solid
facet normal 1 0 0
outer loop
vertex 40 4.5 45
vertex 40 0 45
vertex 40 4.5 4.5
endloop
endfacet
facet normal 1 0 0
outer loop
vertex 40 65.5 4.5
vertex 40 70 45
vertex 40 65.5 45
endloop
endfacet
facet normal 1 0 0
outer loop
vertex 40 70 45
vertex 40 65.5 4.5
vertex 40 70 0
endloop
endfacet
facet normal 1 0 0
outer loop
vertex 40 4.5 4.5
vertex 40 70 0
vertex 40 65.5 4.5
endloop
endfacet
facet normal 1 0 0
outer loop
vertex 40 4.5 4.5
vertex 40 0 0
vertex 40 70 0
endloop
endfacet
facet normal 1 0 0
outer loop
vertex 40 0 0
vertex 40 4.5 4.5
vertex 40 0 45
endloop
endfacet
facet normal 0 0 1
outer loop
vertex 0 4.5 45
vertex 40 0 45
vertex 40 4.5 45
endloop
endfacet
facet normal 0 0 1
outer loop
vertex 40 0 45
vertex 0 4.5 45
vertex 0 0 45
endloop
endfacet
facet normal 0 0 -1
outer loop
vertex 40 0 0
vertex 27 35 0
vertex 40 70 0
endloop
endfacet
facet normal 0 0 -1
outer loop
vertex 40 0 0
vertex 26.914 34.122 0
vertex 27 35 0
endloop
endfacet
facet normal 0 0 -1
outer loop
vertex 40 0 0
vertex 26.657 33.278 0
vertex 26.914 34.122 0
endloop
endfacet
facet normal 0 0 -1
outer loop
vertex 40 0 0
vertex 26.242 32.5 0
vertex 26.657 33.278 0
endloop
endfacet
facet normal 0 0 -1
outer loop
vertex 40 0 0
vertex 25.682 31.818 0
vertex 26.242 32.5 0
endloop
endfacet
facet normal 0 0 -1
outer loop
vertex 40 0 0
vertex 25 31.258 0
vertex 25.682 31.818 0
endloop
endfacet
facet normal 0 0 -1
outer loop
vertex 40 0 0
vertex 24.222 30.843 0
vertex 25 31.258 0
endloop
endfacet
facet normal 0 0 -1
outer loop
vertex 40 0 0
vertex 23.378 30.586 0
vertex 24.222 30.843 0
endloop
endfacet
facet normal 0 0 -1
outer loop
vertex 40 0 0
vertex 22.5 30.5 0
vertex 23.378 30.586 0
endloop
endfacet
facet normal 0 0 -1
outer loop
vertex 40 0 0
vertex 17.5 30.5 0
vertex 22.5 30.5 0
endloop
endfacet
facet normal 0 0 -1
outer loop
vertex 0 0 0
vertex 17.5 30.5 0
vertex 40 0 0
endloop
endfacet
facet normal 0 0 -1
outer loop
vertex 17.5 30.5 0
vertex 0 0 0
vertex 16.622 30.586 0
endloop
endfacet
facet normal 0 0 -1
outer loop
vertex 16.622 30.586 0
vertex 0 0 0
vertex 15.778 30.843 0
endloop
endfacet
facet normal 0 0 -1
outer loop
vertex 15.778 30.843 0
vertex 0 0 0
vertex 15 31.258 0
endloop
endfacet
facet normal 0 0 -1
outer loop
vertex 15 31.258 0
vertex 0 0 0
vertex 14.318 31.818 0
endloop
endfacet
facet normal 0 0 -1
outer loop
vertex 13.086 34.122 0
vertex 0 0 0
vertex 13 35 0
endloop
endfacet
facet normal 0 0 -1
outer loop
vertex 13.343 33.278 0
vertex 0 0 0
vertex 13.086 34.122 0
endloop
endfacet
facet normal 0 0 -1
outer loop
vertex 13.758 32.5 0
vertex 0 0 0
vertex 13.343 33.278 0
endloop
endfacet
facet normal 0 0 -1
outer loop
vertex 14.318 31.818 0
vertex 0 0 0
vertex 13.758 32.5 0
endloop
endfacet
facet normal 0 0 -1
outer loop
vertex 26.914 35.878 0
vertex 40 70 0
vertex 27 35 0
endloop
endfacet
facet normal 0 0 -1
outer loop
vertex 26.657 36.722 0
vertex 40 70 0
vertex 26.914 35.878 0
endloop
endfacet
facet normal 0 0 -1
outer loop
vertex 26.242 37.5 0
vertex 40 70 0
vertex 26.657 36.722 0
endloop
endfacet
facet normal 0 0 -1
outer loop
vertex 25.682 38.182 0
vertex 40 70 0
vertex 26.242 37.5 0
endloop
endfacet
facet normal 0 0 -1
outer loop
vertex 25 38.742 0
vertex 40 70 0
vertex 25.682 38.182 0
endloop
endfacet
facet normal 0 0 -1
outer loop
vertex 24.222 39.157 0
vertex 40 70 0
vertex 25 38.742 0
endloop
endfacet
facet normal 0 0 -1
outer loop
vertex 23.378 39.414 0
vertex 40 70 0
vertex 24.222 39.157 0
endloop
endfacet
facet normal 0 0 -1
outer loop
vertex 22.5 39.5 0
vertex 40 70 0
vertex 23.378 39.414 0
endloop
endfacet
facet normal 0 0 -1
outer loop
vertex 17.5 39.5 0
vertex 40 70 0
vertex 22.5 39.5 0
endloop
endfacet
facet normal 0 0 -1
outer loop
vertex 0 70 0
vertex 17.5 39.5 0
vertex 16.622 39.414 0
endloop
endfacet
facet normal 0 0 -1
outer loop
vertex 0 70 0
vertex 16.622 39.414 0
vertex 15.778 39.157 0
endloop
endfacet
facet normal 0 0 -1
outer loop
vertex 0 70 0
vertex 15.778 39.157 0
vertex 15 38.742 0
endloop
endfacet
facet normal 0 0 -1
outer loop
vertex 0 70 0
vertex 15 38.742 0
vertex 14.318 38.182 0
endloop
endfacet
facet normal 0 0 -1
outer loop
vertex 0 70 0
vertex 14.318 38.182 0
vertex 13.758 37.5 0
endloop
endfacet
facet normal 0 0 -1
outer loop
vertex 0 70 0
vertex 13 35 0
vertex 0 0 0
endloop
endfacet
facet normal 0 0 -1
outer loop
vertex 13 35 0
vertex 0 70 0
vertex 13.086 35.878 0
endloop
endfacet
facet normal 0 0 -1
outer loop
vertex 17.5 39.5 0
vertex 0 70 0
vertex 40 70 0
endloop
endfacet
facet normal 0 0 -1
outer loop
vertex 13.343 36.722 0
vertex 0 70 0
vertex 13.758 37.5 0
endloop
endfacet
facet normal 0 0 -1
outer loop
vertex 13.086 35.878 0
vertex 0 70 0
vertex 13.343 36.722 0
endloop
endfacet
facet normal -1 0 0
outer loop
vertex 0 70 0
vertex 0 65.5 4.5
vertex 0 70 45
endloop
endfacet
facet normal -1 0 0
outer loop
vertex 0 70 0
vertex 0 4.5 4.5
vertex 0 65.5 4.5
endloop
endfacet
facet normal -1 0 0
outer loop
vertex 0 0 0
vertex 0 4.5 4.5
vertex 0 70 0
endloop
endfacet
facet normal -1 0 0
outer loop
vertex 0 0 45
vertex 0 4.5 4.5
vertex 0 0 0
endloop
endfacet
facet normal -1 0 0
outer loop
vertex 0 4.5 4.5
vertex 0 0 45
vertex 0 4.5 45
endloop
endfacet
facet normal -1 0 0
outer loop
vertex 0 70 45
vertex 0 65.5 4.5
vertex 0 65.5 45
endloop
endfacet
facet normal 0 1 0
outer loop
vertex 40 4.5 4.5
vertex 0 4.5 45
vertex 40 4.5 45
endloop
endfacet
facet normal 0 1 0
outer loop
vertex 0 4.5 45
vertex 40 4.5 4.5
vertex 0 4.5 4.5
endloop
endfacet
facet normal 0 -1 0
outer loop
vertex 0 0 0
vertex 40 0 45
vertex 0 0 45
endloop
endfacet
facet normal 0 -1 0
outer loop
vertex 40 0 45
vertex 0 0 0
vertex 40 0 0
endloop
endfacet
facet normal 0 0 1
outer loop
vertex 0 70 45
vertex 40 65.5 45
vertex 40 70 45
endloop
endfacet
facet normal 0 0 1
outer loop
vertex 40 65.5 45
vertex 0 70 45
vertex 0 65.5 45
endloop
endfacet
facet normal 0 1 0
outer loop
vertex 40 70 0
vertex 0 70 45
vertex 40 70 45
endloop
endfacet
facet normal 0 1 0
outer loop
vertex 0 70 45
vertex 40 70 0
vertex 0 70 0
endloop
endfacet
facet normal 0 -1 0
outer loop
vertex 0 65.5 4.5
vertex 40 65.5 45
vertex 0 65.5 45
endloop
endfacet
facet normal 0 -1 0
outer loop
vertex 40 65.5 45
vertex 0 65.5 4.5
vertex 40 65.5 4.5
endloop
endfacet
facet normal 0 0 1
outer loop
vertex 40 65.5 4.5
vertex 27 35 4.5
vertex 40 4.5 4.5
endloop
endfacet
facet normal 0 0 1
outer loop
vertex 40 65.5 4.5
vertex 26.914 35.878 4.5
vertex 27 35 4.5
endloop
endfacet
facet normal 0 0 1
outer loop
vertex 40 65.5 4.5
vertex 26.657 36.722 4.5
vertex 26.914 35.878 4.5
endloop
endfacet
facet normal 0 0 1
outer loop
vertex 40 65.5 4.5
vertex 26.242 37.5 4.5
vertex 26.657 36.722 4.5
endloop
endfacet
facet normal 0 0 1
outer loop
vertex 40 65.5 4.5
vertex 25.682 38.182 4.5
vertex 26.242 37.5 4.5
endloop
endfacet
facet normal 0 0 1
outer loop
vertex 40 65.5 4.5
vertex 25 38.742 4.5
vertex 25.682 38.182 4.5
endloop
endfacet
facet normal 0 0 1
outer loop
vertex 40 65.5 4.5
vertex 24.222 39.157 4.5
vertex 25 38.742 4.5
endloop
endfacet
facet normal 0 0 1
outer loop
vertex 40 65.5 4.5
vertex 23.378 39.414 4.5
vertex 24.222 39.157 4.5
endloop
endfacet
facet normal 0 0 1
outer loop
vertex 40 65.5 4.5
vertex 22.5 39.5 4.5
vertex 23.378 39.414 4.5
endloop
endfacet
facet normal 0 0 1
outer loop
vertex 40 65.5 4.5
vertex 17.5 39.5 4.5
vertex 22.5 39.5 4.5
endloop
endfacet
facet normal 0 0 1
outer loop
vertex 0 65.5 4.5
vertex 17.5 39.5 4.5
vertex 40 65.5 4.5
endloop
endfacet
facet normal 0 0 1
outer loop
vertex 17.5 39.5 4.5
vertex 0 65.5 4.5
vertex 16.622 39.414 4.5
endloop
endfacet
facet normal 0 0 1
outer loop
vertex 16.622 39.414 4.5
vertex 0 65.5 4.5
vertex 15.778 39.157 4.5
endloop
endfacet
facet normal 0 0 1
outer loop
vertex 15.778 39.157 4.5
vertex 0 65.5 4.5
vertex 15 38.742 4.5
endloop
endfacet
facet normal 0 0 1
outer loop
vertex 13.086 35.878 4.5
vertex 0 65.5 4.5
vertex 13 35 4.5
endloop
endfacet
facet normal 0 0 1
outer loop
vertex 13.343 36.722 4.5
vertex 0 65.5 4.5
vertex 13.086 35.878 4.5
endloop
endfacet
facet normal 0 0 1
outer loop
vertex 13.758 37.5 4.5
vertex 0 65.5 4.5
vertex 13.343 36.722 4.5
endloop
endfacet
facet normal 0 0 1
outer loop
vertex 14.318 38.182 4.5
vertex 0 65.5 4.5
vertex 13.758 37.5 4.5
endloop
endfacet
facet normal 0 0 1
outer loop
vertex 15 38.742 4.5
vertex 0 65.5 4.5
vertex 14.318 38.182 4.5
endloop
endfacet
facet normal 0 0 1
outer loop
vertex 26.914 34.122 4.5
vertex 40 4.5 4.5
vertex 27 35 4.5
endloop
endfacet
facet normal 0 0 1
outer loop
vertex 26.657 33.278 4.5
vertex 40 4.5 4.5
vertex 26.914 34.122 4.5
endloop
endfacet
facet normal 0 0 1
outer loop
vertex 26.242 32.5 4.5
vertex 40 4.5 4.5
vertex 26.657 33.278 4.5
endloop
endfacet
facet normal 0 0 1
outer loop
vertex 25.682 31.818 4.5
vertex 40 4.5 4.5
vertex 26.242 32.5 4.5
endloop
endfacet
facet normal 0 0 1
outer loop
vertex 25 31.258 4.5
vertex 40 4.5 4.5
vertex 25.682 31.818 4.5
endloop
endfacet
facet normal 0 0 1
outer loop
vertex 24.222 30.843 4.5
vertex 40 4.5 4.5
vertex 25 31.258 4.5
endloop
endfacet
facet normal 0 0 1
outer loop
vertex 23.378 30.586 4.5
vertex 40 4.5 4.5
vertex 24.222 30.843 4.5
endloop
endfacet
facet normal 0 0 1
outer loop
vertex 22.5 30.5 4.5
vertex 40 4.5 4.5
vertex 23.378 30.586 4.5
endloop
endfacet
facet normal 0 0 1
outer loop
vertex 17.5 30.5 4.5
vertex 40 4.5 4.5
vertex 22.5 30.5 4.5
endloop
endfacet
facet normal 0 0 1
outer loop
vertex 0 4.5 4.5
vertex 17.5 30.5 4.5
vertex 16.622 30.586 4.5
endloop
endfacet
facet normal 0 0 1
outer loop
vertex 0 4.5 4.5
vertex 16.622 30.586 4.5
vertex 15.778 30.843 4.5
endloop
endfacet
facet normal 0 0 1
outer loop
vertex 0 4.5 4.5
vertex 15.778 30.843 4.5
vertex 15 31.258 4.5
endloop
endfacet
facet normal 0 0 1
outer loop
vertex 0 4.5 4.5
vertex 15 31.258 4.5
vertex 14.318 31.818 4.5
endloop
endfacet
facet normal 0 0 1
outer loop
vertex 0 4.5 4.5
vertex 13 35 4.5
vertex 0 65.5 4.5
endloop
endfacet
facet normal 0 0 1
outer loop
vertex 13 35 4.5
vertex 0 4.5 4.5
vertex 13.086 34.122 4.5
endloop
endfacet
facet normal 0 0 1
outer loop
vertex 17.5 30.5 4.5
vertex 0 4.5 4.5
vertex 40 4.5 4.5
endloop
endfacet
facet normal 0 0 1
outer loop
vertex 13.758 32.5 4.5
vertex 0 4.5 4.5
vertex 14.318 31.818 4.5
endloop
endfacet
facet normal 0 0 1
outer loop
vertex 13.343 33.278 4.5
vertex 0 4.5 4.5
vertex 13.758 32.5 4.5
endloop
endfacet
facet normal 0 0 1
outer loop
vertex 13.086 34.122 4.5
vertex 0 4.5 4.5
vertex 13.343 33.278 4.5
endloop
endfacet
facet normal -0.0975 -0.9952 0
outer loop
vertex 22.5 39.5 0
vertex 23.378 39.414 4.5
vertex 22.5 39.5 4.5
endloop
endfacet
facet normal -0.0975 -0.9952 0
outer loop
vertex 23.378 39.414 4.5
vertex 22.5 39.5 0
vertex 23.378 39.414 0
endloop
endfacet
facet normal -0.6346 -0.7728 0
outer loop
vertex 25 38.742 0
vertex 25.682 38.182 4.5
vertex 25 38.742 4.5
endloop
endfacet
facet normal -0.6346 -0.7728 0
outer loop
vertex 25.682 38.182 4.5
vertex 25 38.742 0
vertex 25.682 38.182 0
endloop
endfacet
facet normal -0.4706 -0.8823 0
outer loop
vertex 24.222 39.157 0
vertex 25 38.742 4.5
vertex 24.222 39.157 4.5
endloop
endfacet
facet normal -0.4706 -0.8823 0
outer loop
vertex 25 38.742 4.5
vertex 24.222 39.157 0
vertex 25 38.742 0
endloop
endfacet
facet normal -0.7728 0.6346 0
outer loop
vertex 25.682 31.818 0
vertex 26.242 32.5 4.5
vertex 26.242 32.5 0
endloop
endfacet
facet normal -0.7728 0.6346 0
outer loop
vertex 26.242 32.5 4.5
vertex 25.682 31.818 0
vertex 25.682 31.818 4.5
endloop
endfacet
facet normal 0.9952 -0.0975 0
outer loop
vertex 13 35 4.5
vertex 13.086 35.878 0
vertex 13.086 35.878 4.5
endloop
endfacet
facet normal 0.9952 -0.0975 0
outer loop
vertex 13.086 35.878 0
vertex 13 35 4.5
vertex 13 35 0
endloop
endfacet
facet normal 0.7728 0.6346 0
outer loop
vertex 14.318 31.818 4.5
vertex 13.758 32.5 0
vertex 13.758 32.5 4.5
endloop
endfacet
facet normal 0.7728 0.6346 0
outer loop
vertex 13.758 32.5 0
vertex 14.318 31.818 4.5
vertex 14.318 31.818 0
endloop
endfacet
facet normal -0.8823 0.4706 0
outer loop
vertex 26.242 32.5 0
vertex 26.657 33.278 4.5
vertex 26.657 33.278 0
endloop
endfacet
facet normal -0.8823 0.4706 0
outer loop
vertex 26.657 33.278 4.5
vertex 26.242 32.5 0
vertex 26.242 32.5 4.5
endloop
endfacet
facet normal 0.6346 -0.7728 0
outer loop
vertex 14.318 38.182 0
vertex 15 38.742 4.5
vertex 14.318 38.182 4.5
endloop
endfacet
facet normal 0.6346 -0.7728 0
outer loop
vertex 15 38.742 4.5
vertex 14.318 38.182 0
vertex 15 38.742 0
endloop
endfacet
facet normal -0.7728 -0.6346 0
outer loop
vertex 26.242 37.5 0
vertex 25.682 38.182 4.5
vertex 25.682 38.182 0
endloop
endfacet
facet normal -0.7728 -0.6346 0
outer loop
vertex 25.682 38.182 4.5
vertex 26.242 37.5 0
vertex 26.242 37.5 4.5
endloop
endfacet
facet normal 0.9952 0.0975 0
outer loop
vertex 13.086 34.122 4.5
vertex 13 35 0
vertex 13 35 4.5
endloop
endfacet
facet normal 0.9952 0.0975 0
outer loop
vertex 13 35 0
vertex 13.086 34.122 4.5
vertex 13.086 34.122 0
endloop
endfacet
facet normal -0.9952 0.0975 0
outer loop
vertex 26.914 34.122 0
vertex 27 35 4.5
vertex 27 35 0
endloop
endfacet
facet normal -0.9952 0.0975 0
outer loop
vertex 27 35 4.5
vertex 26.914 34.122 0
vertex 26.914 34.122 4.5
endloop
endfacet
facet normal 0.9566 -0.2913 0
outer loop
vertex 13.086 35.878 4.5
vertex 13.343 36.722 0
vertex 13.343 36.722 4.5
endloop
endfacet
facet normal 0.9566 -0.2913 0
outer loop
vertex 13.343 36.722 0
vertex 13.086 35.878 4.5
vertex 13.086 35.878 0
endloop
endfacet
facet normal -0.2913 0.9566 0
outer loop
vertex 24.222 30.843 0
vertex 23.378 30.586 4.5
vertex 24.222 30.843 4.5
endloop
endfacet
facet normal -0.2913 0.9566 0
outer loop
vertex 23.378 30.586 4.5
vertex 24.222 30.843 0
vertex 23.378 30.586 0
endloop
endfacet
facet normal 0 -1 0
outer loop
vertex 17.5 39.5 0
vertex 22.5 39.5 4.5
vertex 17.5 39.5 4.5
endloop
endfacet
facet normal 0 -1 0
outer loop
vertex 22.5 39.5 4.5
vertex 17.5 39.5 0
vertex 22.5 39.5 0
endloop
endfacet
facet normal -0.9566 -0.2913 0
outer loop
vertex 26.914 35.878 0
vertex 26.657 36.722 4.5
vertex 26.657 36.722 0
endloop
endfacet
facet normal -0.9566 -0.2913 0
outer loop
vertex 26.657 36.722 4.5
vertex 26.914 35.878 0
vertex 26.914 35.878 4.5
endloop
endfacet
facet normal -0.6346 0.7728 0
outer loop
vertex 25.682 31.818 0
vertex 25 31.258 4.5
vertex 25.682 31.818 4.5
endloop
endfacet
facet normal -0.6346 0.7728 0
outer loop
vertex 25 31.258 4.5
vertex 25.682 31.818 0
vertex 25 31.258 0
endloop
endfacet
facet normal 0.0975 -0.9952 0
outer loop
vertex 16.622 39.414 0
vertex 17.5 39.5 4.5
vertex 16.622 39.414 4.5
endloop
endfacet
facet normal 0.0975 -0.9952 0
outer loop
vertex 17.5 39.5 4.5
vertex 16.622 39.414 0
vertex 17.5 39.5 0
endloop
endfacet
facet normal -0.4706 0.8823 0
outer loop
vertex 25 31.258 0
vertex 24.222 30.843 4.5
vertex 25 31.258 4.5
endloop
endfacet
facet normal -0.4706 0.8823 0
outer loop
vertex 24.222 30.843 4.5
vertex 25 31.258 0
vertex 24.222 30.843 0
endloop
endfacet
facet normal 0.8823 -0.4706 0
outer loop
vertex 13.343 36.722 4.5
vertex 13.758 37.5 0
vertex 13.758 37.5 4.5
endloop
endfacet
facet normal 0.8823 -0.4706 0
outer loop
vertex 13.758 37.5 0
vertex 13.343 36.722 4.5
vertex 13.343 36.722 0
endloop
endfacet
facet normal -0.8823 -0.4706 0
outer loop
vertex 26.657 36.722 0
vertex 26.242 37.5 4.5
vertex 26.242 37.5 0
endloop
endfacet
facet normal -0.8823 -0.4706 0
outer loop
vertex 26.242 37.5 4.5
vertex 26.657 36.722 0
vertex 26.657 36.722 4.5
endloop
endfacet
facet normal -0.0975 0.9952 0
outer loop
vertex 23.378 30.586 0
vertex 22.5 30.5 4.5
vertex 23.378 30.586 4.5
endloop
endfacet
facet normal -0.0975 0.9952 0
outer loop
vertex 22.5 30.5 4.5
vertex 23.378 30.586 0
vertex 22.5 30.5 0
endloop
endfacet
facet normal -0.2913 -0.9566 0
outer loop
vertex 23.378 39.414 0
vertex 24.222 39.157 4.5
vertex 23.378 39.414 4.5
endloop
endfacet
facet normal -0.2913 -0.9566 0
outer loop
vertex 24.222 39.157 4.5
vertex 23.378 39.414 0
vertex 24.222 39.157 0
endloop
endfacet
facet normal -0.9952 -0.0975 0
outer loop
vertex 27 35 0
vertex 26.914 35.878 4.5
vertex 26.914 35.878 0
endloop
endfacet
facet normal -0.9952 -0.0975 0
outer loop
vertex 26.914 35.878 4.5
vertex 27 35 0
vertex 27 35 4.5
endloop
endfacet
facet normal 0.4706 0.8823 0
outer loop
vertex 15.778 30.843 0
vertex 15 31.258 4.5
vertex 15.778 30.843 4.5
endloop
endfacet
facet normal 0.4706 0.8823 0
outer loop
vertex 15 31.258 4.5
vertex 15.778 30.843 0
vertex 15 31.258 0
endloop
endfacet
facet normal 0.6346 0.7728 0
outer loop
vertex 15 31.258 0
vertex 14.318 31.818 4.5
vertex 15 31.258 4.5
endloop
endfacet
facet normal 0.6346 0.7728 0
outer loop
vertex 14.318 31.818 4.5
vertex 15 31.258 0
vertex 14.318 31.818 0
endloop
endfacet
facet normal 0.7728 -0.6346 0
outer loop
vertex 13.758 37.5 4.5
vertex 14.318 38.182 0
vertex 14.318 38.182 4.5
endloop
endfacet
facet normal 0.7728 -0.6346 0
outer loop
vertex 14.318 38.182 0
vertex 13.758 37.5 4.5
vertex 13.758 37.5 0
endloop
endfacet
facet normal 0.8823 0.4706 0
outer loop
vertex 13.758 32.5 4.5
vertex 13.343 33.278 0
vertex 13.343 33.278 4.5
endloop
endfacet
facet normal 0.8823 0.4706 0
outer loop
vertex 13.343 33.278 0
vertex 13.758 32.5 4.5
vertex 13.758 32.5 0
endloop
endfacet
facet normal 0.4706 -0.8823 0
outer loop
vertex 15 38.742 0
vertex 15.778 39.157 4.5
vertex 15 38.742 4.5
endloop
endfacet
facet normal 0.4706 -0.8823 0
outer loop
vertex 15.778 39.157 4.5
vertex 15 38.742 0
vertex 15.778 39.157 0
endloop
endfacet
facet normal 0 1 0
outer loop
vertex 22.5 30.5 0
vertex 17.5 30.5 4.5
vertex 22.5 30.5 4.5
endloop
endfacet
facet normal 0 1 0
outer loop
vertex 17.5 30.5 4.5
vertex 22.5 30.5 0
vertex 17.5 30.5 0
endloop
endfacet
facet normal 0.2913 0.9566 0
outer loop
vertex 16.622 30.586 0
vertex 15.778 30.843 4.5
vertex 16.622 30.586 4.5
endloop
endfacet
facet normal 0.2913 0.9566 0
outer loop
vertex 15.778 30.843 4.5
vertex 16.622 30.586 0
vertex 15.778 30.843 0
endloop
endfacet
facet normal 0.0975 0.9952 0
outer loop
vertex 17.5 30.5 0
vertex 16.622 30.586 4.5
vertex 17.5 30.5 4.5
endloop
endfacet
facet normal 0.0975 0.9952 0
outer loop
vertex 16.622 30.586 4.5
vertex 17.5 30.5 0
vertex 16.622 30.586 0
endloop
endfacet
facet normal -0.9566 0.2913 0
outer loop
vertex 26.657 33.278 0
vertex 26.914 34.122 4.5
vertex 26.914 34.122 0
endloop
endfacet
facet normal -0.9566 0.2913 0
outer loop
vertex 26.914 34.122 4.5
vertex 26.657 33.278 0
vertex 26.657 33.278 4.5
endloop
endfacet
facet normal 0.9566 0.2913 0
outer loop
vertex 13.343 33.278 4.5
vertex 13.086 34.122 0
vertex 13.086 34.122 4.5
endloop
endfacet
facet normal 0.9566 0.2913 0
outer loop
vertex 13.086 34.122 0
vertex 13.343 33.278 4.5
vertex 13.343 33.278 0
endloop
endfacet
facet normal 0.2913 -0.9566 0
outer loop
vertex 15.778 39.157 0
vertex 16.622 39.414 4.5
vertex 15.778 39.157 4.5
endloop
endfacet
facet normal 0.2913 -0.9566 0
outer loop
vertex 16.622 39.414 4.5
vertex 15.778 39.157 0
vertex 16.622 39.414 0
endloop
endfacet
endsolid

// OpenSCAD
$fn = 32;

// ----------------------------------------------------------------------
// U-bracket: 40 x 70 x 45 mm
// ----------------------------------------------------------------------

// --- parameters (mm) ---
rail_len = 40;            // outer length, X
jaw_w = 70;               // outer width, Y
jaw_h = 45;               // upright height, Z
web_t = 4.5;              // wall thickness
hole_d = 9;               // clearance for M8
slot_l = 14;              // slot length

module hole_z(px, py) {
  translate([px, py, -0.5]) cylinder(h = web_t + 1, d = hole_d);
}
module hole_y_pz(pz) {
  /* through both uprights along Y */
  translate([0, -0.5, pz]) rotate([-90, 0, 0]) cylinder(h = jaw_w + 1, d = hole_d);
}
module slot_z(px, py) {
  hull() {
    translate([px - (slot_l - hole_d) / 2, py, -0.5]) cylinder(h = web_t + 1, d = hole_d);
    translate([px + (slot_l - hole_d) / 2, py, -0.5]) cylinder(h = web_t + 1, d = hole_d);
  }
}

module base() {
  cube([rail_len, jaw_w, web_t]);
}

module uprights() {
  cube([rail_len, web_t, jaw_h]);
  translate([0, jaw_w - web_t, 0]) cube([rail_len, web_t, jaw_h]);
}

difference() {
  union() {
    base();
    uprights();
  }
  slot_z(20, 35);
}
